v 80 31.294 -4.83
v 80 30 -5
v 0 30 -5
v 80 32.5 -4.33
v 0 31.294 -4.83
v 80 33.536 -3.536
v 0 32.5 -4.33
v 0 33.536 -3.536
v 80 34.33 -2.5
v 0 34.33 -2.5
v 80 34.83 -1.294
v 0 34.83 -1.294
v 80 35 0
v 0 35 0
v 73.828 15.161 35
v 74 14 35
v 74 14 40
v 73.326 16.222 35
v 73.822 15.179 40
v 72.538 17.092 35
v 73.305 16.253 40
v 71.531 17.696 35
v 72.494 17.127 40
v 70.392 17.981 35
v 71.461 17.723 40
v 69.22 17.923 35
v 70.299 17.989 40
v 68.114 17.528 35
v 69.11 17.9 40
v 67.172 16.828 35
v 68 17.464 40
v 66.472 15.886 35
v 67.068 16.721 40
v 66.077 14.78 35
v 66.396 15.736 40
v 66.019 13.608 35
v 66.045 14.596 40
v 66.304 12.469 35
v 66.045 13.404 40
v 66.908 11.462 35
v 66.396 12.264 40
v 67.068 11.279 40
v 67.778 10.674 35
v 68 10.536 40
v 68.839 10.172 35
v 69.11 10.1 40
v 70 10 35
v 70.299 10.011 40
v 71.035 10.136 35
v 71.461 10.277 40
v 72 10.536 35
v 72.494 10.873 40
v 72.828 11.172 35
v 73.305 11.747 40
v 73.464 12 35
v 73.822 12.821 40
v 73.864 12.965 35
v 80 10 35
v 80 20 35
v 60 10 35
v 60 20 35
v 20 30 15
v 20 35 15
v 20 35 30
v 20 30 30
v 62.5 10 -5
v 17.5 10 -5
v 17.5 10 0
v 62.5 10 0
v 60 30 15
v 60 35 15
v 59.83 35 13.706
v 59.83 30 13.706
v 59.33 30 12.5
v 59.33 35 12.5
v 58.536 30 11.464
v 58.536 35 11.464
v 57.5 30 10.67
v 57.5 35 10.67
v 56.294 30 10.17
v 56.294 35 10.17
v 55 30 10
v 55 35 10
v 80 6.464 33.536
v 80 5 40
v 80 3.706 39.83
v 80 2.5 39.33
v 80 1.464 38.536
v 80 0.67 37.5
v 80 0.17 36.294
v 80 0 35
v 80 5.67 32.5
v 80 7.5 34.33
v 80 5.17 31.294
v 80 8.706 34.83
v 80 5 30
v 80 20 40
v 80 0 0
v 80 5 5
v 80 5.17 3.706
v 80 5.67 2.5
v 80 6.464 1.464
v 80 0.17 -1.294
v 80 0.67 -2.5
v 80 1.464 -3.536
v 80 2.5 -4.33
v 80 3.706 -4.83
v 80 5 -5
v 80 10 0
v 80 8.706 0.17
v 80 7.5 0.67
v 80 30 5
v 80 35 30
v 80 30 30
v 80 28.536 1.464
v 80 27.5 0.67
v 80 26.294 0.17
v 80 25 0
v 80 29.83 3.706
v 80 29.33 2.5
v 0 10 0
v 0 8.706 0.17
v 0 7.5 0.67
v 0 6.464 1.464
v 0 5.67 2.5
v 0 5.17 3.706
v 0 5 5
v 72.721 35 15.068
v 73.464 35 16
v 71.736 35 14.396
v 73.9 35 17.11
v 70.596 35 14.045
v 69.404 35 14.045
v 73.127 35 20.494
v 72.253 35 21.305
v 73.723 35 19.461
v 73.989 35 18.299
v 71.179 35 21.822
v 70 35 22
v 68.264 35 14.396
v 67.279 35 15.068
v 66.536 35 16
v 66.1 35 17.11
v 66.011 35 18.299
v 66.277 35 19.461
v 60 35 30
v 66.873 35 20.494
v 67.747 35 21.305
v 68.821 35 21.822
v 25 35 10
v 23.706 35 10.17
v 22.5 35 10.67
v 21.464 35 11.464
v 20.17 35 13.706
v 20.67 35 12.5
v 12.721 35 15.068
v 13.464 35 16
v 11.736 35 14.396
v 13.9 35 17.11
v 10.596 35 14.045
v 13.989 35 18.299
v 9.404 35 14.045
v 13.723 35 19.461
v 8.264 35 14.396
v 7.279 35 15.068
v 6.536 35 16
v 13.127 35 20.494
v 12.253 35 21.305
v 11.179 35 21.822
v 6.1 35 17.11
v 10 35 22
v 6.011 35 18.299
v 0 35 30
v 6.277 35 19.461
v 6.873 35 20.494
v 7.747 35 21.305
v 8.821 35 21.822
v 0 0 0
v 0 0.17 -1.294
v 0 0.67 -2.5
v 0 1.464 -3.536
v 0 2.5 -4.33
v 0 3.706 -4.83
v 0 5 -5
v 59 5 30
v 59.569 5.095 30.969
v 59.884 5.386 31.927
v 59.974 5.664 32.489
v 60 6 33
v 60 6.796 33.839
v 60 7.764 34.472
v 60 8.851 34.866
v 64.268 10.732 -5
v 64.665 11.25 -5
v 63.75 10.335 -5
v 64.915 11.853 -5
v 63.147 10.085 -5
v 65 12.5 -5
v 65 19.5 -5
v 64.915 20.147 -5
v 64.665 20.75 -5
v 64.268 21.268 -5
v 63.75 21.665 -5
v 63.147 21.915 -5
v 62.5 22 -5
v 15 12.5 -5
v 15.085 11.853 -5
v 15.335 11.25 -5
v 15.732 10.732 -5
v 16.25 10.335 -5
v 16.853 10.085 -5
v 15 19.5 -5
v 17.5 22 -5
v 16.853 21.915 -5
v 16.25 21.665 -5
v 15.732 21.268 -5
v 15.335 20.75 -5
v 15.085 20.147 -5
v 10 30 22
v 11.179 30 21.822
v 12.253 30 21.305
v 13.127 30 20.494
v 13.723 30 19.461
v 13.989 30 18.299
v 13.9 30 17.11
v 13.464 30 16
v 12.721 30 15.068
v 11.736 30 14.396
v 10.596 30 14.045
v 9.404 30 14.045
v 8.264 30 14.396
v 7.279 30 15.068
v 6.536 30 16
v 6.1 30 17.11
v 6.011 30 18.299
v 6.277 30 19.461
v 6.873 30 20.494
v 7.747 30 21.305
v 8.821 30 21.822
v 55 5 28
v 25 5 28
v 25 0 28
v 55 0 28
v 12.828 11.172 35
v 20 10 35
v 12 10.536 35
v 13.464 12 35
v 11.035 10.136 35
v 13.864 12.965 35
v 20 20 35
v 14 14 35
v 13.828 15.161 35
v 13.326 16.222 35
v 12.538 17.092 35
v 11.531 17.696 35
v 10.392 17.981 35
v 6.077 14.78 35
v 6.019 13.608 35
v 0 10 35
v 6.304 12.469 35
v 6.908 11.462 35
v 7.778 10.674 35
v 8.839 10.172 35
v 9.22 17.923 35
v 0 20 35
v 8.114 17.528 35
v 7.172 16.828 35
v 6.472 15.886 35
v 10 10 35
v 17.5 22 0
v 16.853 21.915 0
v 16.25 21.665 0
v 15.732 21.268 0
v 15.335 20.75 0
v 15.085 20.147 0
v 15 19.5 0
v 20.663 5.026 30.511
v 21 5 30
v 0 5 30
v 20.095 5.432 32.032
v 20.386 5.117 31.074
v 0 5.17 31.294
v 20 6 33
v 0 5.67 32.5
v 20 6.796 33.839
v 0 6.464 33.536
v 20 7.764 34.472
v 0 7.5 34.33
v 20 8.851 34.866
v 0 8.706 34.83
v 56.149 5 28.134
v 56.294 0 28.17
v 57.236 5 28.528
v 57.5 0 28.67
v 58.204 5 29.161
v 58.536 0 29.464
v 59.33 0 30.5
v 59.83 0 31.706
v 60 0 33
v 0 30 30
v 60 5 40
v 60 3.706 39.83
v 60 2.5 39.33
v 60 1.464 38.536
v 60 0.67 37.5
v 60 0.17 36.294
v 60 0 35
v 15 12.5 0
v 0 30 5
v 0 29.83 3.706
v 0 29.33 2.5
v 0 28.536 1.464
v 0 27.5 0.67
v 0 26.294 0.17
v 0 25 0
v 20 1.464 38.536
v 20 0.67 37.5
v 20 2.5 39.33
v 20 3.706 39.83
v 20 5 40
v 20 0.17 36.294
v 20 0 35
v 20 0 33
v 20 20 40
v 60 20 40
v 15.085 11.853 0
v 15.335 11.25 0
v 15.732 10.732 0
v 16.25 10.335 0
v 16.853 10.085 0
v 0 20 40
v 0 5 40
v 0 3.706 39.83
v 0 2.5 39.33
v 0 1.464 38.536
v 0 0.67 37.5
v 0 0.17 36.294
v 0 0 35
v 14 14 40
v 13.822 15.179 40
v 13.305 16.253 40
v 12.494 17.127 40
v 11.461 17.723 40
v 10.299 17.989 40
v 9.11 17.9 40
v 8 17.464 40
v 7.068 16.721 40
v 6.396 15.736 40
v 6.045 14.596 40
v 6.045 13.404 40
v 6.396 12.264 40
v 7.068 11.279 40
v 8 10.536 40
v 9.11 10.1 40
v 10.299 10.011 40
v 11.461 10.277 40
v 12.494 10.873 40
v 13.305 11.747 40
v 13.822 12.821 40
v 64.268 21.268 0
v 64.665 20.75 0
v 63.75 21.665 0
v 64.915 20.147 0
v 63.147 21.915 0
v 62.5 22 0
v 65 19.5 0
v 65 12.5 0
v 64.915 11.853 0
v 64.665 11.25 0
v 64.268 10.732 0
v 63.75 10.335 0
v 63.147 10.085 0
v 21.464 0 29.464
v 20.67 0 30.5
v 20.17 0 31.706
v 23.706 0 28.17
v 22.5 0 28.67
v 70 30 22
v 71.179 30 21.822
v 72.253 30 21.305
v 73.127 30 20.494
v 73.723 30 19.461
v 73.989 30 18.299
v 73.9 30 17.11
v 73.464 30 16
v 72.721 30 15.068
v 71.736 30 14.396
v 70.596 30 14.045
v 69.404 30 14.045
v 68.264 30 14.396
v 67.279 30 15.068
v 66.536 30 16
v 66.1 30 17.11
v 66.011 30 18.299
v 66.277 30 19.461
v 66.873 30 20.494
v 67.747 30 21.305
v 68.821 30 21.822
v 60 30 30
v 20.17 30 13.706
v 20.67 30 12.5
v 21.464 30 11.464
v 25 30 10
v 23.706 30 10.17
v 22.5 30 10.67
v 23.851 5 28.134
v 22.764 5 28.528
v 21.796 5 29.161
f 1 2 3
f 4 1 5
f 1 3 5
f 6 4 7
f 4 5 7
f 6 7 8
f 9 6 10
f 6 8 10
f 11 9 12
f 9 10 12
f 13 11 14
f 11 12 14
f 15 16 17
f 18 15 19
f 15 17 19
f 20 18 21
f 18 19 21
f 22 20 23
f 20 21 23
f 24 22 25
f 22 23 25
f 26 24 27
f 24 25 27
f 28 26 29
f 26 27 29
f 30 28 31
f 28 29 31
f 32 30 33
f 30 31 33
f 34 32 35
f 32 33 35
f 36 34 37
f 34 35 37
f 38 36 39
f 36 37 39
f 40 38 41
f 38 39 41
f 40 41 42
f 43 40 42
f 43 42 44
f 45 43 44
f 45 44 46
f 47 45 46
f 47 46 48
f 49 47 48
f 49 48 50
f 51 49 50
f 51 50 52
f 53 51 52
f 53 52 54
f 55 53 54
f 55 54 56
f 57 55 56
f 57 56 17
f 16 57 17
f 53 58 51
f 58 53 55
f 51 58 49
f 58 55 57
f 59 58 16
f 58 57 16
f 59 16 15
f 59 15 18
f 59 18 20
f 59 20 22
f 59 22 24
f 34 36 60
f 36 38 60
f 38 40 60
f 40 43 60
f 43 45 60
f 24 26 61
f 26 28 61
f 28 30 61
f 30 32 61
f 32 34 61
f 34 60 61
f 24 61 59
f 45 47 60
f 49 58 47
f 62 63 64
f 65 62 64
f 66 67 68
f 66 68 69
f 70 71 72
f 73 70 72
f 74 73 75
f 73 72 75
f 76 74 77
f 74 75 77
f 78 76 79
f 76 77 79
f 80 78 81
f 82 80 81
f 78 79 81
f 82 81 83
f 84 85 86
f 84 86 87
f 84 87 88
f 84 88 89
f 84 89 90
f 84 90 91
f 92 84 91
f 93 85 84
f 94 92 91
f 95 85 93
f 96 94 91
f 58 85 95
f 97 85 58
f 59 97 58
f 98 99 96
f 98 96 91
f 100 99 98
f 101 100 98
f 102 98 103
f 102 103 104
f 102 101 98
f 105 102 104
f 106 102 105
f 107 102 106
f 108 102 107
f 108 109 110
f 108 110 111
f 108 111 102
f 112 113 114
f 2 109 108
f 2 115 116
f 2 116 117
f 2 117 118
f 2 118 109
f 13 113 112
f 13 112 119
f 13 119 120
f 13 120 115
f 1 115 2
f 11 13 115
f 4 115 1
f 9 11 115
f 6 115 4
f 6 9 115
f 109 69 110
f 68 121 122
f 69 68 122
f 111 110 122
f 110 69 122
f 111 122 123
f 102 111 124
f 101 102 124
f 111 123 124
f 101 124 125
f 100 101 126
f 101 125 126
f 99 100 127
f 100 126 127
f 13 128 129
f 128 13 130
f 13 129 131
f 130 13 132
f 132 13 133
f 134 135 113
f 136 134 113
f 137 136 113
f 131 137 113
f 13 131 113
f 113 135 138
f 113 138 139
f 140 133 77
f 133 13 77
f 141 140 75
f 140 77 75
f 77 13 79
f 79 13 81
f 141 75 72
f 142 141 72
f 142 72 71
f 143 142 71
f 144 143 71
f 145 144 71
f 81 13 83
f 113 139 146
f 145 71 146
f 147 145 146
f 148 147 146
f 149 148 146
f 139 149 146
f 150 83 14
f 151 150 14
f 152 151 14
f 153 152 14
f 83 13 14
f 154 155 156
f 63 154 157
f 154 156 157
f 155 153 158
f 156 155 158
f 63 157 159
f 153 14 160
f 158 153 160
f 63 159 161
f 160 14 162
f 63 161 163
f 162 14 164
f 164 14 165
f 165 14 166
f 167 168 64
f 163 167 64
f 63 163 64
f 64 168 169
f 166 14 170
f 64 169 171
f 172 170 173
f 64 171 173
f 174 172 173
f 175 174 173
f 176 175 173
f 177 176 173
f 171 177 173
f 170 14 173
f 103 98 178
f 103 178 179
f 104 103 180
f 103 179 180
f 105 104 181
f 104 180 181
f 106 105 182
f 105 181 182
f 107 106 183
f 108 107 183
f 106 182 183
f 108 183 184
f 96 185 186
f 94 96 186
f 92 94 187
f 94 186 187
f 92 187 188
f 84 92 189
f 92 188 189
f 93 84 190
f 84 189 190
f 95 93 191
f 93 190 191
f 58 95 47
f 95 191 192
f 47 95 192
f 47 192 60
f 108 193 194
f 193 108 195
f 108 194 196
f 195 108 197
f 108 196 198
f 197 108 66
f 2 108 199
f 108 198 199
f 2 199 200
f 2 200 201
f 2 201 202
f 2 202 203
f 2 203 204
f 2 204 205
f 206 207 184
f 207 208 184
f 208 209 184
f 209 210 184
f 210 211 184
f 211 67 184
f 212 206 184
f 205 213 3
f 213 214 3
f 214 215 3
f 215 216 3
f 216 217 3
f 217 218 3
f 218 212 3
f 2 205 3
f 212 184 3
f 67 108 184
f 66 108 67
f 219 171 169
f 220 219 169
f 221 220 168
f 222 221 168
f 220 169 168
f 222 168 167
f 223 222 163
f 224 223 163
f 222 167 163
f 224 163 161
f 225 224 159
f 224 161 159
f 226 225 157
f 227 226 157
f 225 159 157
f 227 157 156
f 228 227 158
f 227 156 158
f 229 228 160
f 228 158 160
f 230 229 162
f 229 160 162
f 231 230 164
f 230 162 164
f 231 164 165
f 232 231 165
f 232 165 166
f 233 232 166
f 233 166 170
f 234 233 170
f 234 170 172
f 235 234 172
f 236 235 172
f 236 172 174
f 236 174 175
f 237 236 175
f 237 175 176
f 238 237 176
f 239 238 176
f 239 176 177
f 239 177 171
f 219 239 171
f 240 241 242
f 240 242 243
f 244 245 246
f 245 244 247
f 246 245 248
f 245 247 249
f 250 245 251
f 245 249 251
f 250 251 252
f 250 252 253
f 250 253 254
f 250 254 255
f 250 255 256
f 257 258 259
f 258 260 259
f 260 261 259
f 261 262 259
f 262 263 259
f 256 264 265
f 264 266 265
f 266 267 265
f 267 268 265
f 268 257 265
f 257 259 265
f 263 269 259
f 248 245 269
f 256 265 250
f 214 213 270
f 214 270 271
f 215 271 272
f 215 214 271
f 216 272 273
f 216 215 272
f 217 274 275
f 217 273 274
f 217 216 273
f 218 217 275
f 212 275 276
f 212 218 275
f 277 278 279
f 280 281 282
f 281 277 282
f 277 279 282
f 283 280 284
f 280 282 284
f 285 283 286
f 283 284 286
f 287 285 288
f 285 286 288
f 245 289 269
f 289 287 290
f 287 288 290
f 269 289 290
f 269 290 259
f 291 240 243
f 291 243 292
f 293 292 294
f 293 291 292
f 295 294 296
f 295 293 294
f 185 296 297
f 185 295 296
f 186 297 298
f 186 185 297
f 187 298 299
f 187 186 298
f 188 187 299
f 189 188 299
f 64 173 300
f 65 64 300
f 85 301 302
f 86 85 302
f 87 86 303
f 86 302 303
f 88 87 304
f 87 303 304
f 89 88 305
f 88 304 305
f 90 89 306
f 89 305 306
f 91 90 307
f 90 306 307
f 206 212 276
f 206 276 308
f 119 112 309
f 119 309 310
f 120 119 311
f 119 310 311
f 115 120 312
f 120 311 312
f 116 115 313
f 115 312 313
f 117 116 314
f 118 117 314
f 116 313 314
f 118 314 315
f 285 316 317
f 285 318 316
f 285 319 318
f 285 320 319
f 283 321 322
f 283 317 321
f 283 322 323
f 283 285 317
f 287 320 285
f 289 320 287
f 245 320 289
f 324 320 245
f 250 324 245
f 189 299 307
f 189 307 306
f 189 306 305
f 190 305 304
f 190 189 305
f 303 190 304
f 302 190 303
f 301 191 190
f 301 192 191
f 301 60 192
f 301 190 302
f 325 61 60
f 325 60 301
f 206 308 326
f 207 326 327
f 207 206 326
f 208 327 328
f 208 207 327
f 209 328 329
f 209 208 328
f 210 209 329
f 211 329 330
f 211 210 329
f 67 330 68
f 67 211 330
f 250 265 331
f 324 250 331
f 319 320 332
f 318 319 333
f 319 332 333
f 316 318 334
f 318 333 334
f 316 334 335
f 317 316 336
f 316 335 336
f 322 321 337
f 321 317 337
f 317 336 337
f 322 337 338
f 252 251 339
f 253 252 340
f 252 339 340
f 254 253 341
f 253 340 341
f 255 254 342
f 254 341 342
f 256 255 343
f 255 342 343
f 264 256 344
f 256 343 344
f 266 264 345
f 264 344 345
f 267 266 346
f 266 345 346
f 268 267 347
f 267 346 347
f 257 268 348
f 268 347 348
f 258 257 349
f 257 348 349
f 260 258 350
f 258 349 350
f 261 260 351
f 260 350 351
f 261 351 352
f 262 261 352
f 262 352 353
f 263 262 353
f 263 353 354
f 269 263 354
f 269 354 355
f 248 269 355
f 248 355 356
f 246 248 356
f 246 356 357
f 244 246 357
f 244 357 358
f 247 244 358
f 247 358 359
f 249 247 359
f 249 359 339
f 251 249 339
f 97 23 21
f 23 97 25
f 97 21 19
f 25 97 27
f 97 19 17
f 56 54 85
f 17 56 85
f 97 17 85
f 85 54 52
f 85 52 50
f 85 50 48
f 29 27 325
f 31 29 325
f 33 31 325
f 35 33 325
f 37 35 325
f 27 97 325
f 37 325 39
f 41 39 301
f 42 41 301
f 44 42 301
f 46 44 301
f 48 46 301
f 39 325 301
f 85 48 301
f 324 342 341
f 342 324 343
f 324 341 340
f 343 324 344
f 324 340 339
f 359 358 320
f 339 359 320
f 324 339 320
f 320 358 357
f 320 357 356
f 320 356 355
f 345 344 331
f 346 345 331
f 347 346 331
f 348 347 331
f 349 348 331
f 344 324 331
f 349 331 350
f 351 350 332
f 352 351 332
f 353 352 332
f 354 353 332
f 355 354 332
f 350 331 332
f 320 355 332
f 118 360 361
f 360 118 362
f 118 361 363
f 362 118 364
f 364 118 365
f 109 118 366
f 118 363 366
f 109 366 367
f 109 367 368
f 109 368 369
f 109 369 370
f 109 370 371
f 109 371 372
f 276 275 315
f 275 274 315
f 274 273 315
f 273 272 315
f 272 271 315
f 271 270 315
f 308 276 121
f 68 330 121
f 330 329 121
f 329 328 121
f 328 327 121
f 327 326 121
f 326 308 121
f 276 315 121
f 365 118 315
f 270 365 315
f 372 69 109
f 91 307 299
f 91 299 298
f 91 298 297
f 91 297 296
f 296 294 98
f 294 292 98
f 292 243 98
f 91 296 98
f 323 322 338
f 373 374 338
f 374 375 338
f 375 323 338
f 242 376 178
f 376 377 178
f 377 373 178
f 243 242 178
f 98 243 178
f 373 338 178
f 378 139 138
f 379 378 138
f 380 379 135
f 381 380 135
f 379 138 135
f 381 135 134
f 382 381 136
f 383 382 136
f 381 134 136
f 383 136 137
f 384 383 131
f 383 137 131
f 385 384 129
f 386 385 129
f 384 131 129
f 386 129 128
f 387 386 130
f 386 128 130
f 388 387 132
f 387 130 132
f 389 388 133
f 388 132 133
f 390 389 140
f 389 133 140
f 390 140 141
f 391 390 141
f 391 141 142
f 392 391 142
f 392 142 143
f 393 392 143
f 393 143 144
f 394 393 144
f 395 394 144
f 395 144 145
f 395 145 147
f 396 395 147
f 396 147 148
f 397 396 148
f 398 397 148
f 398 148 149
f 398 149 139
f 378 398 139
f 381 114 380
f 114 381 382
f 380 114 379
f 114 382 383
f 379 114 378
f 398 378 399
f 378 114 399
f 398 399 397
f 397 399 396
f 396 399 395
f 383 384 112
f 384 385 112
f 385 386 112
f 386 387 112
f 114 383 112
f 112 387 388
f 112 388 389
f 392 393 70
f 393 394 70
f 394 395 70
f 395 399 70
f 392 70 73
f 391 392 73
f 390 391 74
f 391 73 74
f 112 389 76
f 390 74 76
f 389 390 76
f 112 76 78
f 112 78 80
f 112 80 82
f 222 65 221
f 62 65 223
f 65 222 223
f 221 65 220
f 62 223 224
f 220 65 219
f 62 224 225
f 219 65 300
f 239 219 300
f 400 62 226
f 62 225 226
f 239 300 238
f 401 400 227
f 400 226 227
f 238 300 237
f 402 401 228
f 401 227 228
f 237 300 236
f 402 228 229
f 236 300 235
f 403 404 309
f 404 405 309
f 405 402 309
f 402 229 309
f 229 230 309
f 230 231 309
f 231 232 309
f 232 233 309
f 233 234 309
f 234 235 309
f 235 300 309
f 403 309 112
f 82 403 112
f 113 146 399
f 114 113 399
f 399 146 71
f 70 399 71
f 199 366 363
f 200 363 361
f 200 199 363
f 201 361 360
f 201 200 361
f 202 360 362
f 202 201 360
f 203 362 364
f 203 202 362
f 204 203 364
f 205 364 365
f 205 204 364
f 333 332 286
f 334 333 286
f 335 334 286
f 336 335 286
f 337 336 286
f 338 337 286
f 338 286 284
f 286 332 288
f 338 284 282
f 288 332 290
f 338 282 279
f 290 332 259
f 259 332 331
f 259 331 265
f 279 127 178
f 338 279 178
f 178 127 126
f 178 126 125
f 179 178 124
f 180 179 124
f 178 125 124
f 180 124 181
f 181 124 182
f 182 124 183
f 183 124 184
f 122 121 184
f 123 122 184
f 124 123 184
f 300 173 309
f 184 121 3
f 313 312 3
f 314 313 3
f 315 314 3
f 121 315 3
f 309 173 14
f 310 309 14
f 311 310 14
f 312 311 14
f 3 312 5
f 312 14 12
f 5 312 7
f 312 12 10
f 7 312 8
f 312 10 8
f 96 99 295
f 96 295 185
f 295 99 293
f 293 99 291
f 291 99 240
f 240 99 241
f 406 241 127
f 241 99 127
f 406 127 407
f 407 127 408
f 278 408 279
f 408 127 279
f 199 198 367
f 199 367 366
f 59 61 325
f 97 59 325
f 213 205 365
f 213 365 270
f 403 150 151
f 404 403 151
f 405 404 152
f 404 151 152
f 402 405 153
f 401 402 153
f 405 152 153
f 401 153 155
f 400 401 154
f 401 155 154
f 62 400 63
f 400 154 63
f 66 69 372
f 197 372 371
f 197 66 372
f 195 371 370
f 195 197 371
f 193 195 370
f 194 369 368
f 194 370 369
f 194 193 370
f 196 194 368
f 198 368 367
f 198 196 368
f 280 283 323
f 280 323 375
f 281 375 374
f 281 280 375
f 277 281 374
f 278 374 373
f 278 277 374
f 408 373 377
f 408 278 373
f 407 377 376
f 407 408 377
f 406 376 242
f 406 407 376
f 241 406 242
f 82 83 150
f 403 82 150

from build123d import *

# Parameters (mm, degrees)
BOSS_EXTRUDE1_DEPTH = 80
CUT_EXTRUDE1_REACH  = 100.234
CUT_EXTRUDE2_DEPTH  = 80
CUT_EXTRUDE3_REACH  = 98.047
SKETCH5_R           = 4
CUT_EXTRUDE4_REACH  = 100.234
SKETCH6_R           = 4


with BuildPart() as part:
    # Sketch1 → Boss-Extrude1 (new body)
    with BuildSketch(Plane(origin=(0, 0, 0), x_dir=(0, 0, -1), z_dir=(1, 0, 0))):
        with BuildLine():
            Line((-40, 20), (-40, 5))
            ThreePointArc((-40, 5), (-38.535533906, 1.464466094), (-35, 0))
            Line((-35, 0), (0, 0))
            ThreePointArc((0, 0), (3.535533906, 1.464466094), (5, 5))
            Line((5, 5), (5, 30))
            ThreePointArc((5, 30), (3.535533906, 33.535533906), (0, 35))
            Line((0, 35), (-30, 35))
            Line((-30, 35), (-30, 30))
            Line((-30, 30), (-5, 30))
            ThreePointArc((-5, 30), (-1.464466094, 28.535533906), (0, 25))
            Line((0, 25), (0, 10))
            ThreePointArc((0, 10), (-1.464466094, 6.464466094), (-5, 5))
            Line((-5, 5), (-30, 5))
            ThreePointArc((-30, 5), (-33.535533906, 6.464466094), (-35, 10))
            Line((-35, 10), (-35, 20))
            Line((-35, 20), (-40, 20))
        make_face()
    extrude(amount=BOSS_EXTRUDE1_DEPTH)

    # Sketch2 → Cut-Extrude1 (cut, up to next)
    with BuildSketch(Plane(origin=(0, 0, -5), x_dir=(-1, 0, 0), z_dir=(0, 0, -1)), mode=Mode.PRIVATE) as cut_extrude1_sk1:
        with BuildLine():
            Line((-62.5, 22), (-17.5, 22))
            ThreePointArc((-17.5, 22), (-15.732233047, 21.267766953), (-15, 19.5))
            Line((-15, 19.5), (-15, 12.5))
            ThreePointArc((-15, 12.5), (-15.732233047, 10.732233047), (-17.5, 10))
            Line((-17.5, 10), (-62.5, 10))
            ThreePointArc((-62.5, 10), (-64.267766953, 10.732233047), (-65, 12.5))
            Line((-65, 12.5), (-65, 19.5))
            ThreePointArc((-65, 19.5), (-64.267766953, 21.267766953), (-62.5, 22))
        make_face()
    cut_extrude1_tool1 = extrude(cut_extrude1_sk1.sketch, amount=-CUT_EXTRUDE1_REACH, mode=Mode.PRIVATE) & part.part
    add(cut_extrude1_tool1.solids().sort_by_distance((40, 16, -5))[0], mode=Mode.SUBTRACT)

    # Sketch4 → Cut-Extrude2 (cut)
    with BuildSketch(Plane(origin=(0, 35, 0), x_dir=(1, 0, 0), z_dir=(0, 1, 0))):
        with BuildLine():
            Line((20, -40), (20, -33))
            ThreePointArc((20, -33), (21.464466094, -29.464466094), (25, -28))
            Line((25, -28), (55, -28))
            ThreePointArc((55, -28), (58.535533906, -29.464466094), (60, -33))
            Line((60, -33), (60, -40))
            Line((60, -40), (20, -40))
        make_face()
    extrude(amount=-CUT_EXTRUDE2_DEPTH, mode=Mode.SUBTRACT)

    # Sketch5 → Cut-Extrude3 (cut, up to next)
    with BuildSketch(Plane(origin=(0, 35, 0), x_dir=(1, 0, 0), z_dir=(0, 1, 0)), mode=Mode.PRIVATE) as cut_extrude3_sk1:
        with Locations(Location((10, -18, 0), (0, 0, 270))):
            Circle(SKETCH5_R)
    cut_extrude3_tool1 = extrude(cut_extrude3_sk1.sketch, amount=-CUT_EXTRUDE3_REACH, mode=Mode.PRIVATE) & part.part
    # Sketch5 → Cut-Extrude3 (cut, up to next)
    with BuildSketch(Plane(origin=(0, 35, 0), x_dir=(1, 0, 0), z_dir=(0, 1, 0)), mode=Mode.PRIVATE) as cut_extrude3_sk2:
        with Locations(Location((70, -18, 0), (0, 0, 270))):
            Circle(SKETCH5_R)
    cut_extrude3_tool2 = extrude(cut_extrude3_sk2.sketch, amount=-CUT_EXTRUDE3_REACH, mode=Mode.PRIVATE) & part.part
    # Sketch5 → Cut-Extrude3 (cut, up to next)
    with BuildSketch(Plane(origin=(0, 35, 0), x_dir=(1, 0, 0), z_dir=(0, 1, 0)), mode=Mode.PRIVATE) as cut_extrude3_sk3:
        with BuildLine():
            Line((20, -30), (21, -30))
            ThreePointArc((21, -30), (22.763932023, -28.527864045), (25, -28))
            Line((25, -28), (55, -28))
            ThreePointArc((55, -28), (57.236067977, -28.527864045), (59, -30))
            Line((59, -30), (60, -30))
            Line((60, -30), (60, -15))
            ThreePointArc((60, -15), (58.535533906, -11.464466094), (55, -10))
            Line((55, -10), (25, -10))
            ThreePointArc((25, -10), (21.464466094, -11.464466094), (20, -15))
            Line((20, -15), (20, -30))
        make_face()
    cut_extrude3_tool3 = extrude(cut_extrude3_sk3.sketch, amount=-CUT_EXTRUDE3_REACH, mode=Mode.PRIVATE) & part.part
    add(cut_extrude3_tool1.solids().sort_by_distance((10, 35, 18))[0], mode=Mode.SUBTRACT)
    add(cut_extrude3_tool2.solids().sort_by_distance((70, 35, 18))[0], mode=Mode.SUBTRACT)
    add(cut_extrude3_tool3.solids().sort_by_distance((40, 35, 19.237715))[0], mode=Mode.SUBTRACT)

    # Sketch6 → Cut-Extrude4 (cut, up to next)
    with BuildSketch(Plane.XY.offset(40), mode=Mode.PRIVATE) as cut_extrude4_sk1:
        with Locations((10, 14)):
            Circle(SKETCH6_R)
    cut_extrude4_tool1 = extrude(cut_extrude4_sk1.sketch, amount=-CUT_EXTRUDE4_REACH, mode=Mode.PRIVATE) & part.part
    # Sketch6 → Cut-Extrude4 (cut, up to next)
    with BuildSketch(Plane.XY.offset(40), mode=Mode.PRIVATE) as cut_extrude4_sk2:
        with Locations((70, 14)):
            Circle(SKETCH6_R)
    cut_extrude4_tool2 = extrude(cut_extrude4_sk2.sketch, amount=-CUT_EXTRUDE4_REACH, mode=Mode.PRIVATE) & part.part
    add(cut_extrude4_tool1.solids().sort_by_distance((10, 14, 40))[0], mode=Mode.SUBTRACT)
    add(cut_extrude4_tool2.solids().sort_by_distance((70, 14, 40))[0], mode=Mode.SUBTRACT)


solid = part.part
